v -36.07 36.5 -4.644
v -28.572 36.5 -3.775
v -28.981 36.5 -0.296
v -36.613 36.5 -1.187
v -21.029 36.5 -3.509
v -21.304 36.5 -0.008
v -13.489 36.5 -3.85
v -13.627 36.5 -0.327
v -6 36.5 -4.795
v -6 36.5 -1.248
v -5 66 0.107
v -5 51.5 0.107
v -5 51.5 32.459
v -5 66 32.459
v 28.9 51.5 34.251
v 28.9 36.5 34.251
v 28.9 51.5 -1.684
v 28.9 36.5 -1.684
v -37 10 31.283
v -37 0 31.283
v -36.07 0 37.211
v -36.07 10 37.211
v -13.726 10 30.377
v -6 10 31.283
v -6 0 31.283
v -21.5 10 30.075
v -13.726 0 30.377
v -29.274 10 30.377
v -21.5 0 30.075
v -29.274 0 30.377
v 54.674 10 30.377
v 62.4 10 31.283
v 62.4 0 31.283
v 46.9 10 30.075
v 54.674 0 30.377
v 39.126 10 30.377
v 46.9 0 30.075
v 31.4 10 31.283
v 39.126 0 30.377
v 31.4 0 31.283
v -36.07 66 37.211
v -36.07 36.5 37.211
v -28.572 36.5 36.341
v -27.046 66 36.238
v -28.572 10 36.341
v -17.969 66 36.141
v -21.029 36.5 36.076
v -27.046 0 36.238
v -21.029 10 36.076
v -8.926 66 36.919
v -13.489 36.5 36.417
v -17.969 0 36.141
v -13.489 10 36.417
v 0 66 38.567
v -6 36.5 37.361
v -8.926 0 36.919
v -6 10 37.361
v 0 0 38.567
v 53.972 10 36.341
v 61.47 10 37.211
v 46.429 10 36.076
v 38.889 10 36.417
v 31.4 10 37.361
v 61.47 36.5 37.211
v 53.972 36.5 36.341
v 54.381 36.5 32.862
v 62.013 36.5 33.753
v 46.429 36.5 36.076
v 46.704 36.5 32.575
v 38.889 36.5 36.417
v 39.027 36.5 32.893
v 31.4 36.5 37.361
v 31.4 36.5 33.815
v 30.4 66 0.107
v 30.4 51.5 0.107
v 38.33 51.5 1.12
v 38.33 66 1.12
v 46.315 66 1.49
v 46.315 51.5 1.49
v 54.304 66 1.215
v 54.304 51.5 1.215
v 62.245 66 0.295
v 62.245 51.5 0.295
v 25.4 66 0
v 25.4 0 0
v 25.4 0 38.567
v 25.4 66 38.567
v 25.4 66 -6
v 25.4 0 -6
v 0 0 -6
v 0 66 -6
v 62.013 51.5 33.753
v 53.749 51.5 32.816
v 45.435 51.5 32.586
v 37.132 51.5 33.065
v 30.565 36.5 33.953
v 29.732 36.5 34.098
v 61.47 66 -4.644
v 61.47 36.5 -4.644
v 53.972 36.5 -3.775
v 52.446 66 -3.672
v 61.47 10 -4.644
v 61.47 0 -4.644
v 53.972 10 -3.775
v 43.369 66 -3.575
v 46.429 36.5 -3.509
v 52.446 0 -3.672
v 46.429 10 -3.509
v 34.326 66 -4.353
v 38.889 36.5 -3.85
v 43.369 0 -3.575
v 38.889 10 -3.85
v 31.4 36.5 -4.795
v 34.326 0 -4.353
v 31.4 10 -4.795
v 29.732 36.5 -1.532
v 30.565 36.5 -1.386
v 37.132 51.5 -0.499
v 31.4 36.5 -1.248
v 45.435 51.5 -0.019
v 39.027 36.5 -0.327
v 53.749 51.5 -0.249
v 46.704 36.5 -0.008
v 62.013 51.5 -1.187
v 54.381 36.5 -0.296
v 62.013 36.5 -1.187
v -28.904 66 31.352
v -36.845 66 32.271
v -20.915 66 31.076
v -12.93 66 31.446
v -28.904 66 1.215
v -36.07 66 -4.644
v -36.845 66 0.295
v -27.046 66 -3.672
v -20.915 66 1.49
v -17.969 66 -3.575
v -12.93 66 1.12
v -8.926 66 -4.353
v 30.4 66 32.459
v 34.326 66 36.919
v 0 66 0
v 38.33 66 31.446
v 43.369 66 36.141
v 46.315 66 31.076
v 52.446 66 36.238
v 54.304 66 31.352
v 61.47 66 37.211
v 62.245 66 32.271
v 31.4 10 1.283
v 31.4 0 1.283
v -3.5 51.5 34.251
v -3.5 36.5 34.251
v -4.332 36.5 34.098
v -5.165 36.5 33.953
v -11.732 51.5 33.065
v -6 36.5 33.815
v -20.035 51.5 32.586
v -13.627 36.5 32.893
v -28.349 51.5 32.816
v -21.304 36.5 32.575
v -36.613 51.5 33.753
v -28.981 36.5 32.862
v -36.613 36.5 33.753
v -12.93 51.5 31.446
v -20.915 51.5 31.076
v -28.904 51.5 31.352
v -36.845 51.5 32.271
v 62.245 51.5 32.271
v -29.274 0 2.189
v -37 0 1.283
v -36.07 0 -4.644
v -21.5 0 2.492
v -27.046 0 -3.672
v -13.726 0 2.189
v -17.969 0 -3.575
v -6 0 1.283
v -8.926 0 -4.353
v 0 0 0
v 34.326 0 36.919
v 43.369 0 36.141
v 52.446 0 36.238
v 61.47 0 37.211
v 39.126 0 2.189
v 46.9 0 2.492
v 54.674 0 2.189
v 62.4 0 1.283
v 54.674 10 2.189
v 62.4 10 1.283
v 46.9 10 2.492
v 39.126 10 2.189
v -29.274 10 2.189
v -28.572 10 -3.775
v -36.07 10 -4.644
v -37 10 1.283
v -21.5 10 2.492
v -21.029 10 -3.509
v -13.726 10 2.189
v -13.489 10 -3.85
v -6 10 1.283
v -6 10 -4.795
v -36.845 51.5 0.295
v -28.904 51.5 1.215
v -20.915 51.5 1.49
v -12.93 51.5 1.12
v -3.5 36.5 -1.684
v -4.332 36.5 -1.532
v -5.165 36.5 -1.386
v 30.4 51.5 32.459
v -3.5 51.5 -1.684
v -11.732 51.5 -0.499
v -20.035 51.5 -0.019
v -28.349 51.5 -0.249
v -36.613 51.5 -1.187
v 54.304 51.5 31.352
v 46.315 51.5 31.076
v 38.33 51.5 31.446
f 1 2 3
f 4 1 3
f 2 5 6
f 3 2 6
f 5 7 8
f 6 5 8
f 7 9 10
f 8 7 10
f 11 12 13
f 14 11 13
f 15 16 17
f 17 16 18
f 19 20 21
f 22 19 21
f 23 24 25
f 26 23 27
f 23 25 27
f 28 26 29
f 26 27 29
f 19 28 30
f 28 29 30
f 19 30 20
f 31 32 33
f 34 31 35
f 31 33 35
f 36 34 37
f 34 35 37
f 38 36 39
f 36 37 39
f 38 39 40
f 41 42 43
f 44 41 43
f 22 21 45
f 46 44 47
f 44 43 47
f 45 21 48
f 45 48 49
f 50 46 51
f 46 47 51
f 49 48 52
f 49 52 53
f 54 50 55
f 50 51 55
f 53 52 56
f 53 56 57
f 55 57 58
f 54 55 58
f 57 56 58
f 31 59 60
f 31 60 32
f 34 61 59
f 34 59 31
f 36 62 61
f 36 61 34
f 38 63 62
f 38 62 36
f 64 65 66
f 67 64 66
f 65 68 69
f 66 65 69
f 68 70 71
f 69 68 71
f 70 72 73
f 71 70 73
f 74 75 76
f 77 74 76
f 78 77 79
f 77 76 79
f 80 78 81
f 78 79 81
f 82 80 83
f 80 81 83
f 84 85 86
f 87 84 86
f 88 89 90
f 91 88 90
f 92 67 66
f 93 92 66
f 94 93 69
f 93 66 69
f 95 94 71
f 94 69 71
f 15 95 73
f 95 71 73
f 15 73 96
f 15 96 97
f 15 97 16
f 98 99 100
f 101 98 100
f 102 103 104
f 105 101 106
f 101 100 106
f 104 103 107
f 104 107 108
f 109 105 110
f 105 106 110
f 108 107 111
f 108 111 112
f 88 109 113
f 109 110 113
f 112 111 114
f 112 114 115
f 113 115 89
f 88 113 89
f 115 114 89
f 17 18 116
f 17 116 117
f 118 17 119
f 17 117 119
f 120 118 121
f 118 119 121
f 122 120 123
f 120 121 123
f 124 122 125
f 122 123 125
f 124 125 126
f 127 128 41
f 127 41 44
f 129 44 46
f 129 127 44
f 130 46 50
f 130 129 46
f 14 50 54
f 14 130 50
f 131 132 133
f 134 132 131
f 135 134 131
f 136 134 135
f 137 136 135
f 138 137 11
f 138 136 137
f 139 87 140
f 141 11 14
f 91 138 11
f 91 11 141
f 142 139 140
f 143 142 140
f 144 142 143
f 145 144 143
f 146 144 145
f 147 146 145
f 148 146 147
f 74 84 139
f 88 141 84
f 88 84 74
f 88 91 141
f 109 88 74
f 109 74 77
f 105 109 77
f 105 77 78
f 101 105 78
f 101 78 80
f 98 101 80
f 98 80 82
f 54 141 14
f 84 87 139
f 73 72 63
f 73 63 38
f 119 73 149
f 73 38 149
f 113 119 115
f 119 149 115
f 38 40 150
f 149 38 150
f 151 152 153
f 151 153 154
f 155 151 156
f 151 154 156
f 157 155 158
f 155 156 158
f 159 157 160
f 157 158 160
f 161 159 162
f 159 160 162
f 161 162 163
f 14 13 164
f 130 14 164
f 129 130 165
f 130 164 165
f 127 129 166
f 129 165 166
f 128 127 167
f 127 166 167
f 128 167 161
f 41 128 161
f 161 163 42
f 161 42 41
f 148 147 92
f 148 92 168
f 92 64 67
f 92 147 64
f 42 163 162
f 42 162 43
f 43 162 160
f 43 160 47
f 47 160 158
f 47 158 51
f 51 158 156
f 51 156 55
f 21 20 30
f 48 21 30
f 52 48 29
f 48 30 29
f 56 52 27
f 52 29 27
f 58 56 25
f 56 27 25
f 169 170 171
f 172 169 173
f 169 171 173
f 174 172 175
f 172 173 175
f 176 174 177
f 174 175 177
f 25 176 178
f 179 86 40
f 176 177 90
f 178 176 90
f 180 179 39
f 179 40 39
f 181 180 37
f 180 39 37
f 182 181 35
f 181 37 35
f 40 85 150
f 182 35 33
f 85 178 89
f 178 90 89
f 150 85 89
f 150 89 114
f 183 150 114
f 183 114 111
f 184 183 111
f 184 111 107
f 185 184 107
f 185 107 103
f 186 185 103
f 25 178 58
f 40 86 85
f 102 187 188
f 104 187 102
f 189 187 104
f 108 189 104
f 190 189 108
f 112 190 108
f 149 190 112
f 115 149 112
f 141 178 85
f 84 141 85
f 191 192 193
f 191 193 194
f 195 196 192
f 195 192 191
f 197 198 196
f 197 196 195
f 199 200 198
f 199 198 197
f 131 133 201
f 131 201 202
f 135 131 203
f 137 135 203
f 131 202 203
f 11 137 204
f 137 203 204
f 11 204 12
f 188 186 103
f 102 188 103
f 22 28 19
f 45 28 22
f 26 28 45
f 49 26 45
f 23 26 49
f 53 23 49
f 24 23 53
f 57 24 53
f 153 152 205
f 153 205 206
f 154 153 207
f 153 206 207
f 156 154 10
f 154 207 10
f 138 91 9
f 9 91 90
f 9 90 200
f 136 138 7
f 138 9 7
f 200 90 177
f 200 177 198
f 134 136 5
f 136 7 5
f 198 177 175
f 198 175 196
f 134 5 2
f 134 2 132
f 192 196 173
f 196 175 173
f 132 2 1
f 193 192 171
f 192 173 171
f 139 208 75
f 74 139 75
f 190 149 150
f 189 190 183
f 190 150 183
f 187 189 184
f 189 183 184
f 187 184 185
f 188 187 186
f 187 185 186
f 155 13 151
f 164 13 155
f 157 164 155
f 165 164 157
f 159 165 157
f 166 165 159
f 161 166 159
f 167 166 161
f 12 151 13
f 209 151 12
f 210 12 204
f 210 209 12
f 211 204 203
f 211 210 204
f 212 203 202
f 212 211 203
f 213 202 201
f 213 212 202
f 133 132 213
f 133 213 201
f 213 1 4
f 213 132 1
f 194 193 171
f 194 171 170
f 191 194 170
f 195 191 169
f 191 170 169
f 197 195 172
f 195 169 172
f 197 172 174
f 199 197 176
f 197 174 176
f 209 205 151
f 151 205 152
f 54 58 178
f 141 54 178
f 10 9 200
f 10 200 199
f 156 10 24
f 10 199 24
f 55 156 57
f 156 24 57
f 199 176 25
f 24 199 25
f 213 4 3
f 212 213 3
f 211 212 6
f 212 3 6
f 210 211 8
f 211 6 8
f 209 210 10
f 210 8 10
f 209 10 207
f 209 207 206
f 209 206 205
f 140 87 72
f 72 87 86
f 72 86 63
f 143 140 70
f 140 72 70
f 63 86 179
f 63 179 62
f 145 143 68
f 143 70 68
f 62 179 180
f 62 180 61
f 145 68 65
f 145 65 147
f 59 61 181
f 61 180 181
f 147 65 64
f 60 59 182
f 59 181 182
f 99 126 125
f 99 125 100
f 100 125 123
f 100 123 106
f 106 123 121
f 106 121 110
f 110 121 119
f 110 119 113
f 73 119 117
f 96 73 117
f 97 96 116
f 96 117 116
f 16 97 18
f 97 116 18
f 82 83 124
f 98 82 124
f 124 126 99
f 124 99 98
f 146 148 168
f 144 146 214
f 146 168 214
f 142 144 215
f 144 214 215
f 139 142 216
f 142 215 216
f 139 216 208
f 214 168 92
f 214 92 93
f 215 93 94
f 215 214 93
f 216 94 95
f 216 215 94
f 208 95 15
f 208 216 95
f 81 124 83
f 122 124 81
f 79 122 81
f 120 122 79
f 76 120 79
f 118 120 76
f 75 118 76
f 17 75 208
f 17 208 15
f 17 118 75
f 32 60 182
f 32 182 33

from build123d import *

# Parameters (mm, degrees)
BOSS_EXTRUDE1_DEPTH = 66
CUT_EXTRUDE1_START  = -15
CUT_EXTRUDE1_DEPTH  = 15
CUT_EXTRUDE2_START  = -14.5
CUT_EXTRUDE2_DEPTH  = 15
SKETCH4_W           = 44.566501288
SKETCH4_H           = 26.5
CUT_EXTRUDE3_DEPTH  = 103.576483765
SKETCH5_W           = 44.566501288
SKETCH5_H           = 26.5
CUT_EXTRUDE4_DEPTH  = 103.576483765


with BuildPart() as part:
    # Sketch1 → Boss-Extrude1 (new body)
    with BuildSketch(Plane(origin=(0, 0, 0), x_dir=(1, 0, 0), z_dir=(0, 1, 0))):
        with BuildLine():
            Line((-6, -1.283250644), (-6, -31.283250644))
            ThreePointArc((-6, -31.283250644), (-21.5, -30.074697642), (-37, -31.283250644))
            Line((-37, -31.283250644), (-36.07, -37.210737464))
            ThreePointArc((-36.07, -37.210737464), (-17.969313256, -36.14102822), (0, -38.566501288))
            Line((0, -38.566501288), (0, 0))
            Line((0, 0), (25.4, 0))
            Line((25.4, 0), (25.4, -38.566501288))
            ThreePointArc((25.4, -38.566501288), (43.369313256, -36.14102822), (61.47, -37.210737464))
            Line((61.47, -37.210737464), (62.4, -31.283250644))
            ThreePointArc((62.4, -31.283250644), (46.9, -30.074697642), (31.4, -31.283250644))
            Line((31.4, -31.283250644), (31.4, -1.283250644))
            ThreePointArc((31.4, -1.283250644), (46.9, -2.491803646), (62.4, -1.283250644))
            Line((62.4, -1.283250644), (61.47, 4.644236176))
            ThreePointArc((61.47, 4.644236176), (43.369313256, 3.574526932), (25.4, 6))
            Line((25.4, 6), (0, 6))
            ThreePointArc((0, 6), (-17.969313256, 3.574526932), (-36.07, 4.644236176))
            Line((-36.07, 4.644236176), (-37, -1.283250644))
            ThreePointArc((-37, -1.283250644), (-21.5, -2.491803646), (-6, -1.283250644))
        make_face()
    extrude(amount=BOSS_EXTRUDE1_DEPTH)

    # Sketch2 → Cut-Extrude1 (cut)
    # profile 1 of 2: a face of its own
    with BuildSketch(Plane(origin=(0, 66, 0), x_dir=(1, 0, 0), z_dir=(0, 1, 0)).offset(CUT_EXTRUDE1_START)):
        with BuildLine():
            Line((-5, -0.107120067), (-5, -32.459381221))
            ThreePointArc((-5, -32.459381221), (-21.5, -31.074697642), (-38, -32.459381221))
            Line((-38, -32.459381221), (-38, -0.107120067))
            ThreePointArc((-38, -0.107120067), (-21.5, -1.491803646), (-5, -0.107120067))
        make_face()
        with BuildLine():
            Line((-6, -1.283250644), (-6, -31.283250644))
            ThreePointArc((-6, -31.283250644), (-21.5, -30.074697642), (-37, -31.283250644))
            Line((-37, -31.283250644), (-37, -1.283250644))
            ThreePointArc((-37, -1.283250644), (-21.5, -2.491803646), (-6, -1.283250644))
        make_face(mode=Mode.SUBTRACT)
    # profile 2 of 2: a face of its own
    with BuildSketch(Plane(origin=(0, 66, 0), x_dir=(1, 0, 0), z_dir=(0, 1, 0)).offset(CUT_EXTRUDE1_START)):
        with BuildLine():
            Line((63.4, -0.107120067), (63.4, -32.459381221))
            ThreePointArc((63.4, -32.459381221), (46.9, -31.074697642), (30.4, -32.459381221))
            Line((30.4, -32.459381221), (30.4, -0.107120067))
            ThreePointArc((30.4, -0.107120067), (46.9, -1.491803646), (63.4, -0.107120067))
        make_face()
        with BuildLine():
            Line((31.4, -1.283250644), (31.4, -31.283250644))
            ThreePointArc((31.4, -31.283250644), (46.9, -30.074697642), (62.4, -31.283250644))
            Line((62.4, -31.283250644), (62.4, -1.283250644))
            ThreePointArc((62.4, -1.283250644), (46.9, -2.491803646), (31.4, -1.283250644))
        make_face(mode=Mode.SUBTRACT)
    extrude(amount=CUT_EXTRUDE1_DEPTH, mode=Mode.SUBTRACT)

    # Sketch3 → Cut-Extrude2 (cut)
    # profile 1 of 2: a face of its own
    with BuildSketch(Plane(origin=(0, 51, 0), x_dir=(1, 0, 0), z_dir=(0, 1, 0)).offset(CUT_EXTRUDE2_START)):
        with BuildLine():
            Line((-3.5, 1.684138832), (-3.5, -34.25064012))
            ThreePointArc((-3.5, -34.25064012), (-21.5, -32.574697642), (-39.5, -34.25064012))
            Line((-39.5, -34.25064012), (-39.5, 1.684138832))
            ThreePointArc((-39.5, 1.684138832), (-21.5, 0.008196354), (-3.5, 1.684138832))
        make_face()
        with BuildLine():
            Line((-37, -1.283250644), (-37, -31.283250644))
            ThreePointArc((-37, -31.283250644), (-21.5, -30.074697642), (-6, -31.283250644))
            Line((-6, -31.283250644), (-6, -1.283250644))
            ThreePointArc((-6, -1.283250644), (-21.5, -2.491803646), (-37, -1.283250644))
        make_face(mode=Mode.SUBTRACT)
    # profile 2 of 2: a face of its own
    with BuildSketch(Plane(origin=(0, 51, 0), x_dir=(1, 0, 0), z_dir=(0, 1, 0)).offset(CUT_EXTRUDE2_START)):
        with BuildLine():
            Line((64.9, 1.684138832), (64.9, -34.25064012))
            ThreePointArc((64.9, -34.25064012), (46.9, -32.574697642), (28.9, -34.25064012))
            Line((28.9, -34.25064012), (28.9, 1.684138832))
            ThreePointArc((28.9, 1.684138832), (46.9, 0.008196354), (64.9, 1.684138832))
        make_face()
        with BuildLine():
            Line((31.4, -1.283250644), (31.4, -31.283250644))
            ThreePointArc((31.4, -31.283250644), (46.9, -30.074697642), (62.4, -31.283250644))
            Line((62.4, -31.283250644), (62.4, -1.283250644))
            ThreePointArc((62.4, -1.283250644), (46.9, -2.491803646), (31.4, -1.283250644))
        make_face(mode=Mode.SUBTRACT)
    extrude(amount=CUT_EXTRUDE2_DEPTH, mode=Mode.SUBTRACT)

    # Sketch4 → Cut-Extrude3 (cut, through all)
    with BuildSketch(Plane.ZY.offset(6)):
        with Locations((16.283250644, 23.25)):
            Rectangle(SKETCH4_W, SKETCH4_H)
    extrude(amount=CUT_EXTRUDE3_DEPTH, mode=Mode.SUBTRACT)

    # Sketch5 → Cut-Extrude4 (cut, through all)
    with BuildSketch(Plane(origin=(31.4, 0, 0), x_dir=(0, 0, -1), z_dir=(1, 0, 0))):
        with Locations((-16.283250644, 23.25)):
            Rectangle(SKETCH5_W, SKETCH5_H)
    extrude(amount=CUT_EXTRUDE4_DEPTH, mode=Mode.SUBTRACT)


solid = part.part
